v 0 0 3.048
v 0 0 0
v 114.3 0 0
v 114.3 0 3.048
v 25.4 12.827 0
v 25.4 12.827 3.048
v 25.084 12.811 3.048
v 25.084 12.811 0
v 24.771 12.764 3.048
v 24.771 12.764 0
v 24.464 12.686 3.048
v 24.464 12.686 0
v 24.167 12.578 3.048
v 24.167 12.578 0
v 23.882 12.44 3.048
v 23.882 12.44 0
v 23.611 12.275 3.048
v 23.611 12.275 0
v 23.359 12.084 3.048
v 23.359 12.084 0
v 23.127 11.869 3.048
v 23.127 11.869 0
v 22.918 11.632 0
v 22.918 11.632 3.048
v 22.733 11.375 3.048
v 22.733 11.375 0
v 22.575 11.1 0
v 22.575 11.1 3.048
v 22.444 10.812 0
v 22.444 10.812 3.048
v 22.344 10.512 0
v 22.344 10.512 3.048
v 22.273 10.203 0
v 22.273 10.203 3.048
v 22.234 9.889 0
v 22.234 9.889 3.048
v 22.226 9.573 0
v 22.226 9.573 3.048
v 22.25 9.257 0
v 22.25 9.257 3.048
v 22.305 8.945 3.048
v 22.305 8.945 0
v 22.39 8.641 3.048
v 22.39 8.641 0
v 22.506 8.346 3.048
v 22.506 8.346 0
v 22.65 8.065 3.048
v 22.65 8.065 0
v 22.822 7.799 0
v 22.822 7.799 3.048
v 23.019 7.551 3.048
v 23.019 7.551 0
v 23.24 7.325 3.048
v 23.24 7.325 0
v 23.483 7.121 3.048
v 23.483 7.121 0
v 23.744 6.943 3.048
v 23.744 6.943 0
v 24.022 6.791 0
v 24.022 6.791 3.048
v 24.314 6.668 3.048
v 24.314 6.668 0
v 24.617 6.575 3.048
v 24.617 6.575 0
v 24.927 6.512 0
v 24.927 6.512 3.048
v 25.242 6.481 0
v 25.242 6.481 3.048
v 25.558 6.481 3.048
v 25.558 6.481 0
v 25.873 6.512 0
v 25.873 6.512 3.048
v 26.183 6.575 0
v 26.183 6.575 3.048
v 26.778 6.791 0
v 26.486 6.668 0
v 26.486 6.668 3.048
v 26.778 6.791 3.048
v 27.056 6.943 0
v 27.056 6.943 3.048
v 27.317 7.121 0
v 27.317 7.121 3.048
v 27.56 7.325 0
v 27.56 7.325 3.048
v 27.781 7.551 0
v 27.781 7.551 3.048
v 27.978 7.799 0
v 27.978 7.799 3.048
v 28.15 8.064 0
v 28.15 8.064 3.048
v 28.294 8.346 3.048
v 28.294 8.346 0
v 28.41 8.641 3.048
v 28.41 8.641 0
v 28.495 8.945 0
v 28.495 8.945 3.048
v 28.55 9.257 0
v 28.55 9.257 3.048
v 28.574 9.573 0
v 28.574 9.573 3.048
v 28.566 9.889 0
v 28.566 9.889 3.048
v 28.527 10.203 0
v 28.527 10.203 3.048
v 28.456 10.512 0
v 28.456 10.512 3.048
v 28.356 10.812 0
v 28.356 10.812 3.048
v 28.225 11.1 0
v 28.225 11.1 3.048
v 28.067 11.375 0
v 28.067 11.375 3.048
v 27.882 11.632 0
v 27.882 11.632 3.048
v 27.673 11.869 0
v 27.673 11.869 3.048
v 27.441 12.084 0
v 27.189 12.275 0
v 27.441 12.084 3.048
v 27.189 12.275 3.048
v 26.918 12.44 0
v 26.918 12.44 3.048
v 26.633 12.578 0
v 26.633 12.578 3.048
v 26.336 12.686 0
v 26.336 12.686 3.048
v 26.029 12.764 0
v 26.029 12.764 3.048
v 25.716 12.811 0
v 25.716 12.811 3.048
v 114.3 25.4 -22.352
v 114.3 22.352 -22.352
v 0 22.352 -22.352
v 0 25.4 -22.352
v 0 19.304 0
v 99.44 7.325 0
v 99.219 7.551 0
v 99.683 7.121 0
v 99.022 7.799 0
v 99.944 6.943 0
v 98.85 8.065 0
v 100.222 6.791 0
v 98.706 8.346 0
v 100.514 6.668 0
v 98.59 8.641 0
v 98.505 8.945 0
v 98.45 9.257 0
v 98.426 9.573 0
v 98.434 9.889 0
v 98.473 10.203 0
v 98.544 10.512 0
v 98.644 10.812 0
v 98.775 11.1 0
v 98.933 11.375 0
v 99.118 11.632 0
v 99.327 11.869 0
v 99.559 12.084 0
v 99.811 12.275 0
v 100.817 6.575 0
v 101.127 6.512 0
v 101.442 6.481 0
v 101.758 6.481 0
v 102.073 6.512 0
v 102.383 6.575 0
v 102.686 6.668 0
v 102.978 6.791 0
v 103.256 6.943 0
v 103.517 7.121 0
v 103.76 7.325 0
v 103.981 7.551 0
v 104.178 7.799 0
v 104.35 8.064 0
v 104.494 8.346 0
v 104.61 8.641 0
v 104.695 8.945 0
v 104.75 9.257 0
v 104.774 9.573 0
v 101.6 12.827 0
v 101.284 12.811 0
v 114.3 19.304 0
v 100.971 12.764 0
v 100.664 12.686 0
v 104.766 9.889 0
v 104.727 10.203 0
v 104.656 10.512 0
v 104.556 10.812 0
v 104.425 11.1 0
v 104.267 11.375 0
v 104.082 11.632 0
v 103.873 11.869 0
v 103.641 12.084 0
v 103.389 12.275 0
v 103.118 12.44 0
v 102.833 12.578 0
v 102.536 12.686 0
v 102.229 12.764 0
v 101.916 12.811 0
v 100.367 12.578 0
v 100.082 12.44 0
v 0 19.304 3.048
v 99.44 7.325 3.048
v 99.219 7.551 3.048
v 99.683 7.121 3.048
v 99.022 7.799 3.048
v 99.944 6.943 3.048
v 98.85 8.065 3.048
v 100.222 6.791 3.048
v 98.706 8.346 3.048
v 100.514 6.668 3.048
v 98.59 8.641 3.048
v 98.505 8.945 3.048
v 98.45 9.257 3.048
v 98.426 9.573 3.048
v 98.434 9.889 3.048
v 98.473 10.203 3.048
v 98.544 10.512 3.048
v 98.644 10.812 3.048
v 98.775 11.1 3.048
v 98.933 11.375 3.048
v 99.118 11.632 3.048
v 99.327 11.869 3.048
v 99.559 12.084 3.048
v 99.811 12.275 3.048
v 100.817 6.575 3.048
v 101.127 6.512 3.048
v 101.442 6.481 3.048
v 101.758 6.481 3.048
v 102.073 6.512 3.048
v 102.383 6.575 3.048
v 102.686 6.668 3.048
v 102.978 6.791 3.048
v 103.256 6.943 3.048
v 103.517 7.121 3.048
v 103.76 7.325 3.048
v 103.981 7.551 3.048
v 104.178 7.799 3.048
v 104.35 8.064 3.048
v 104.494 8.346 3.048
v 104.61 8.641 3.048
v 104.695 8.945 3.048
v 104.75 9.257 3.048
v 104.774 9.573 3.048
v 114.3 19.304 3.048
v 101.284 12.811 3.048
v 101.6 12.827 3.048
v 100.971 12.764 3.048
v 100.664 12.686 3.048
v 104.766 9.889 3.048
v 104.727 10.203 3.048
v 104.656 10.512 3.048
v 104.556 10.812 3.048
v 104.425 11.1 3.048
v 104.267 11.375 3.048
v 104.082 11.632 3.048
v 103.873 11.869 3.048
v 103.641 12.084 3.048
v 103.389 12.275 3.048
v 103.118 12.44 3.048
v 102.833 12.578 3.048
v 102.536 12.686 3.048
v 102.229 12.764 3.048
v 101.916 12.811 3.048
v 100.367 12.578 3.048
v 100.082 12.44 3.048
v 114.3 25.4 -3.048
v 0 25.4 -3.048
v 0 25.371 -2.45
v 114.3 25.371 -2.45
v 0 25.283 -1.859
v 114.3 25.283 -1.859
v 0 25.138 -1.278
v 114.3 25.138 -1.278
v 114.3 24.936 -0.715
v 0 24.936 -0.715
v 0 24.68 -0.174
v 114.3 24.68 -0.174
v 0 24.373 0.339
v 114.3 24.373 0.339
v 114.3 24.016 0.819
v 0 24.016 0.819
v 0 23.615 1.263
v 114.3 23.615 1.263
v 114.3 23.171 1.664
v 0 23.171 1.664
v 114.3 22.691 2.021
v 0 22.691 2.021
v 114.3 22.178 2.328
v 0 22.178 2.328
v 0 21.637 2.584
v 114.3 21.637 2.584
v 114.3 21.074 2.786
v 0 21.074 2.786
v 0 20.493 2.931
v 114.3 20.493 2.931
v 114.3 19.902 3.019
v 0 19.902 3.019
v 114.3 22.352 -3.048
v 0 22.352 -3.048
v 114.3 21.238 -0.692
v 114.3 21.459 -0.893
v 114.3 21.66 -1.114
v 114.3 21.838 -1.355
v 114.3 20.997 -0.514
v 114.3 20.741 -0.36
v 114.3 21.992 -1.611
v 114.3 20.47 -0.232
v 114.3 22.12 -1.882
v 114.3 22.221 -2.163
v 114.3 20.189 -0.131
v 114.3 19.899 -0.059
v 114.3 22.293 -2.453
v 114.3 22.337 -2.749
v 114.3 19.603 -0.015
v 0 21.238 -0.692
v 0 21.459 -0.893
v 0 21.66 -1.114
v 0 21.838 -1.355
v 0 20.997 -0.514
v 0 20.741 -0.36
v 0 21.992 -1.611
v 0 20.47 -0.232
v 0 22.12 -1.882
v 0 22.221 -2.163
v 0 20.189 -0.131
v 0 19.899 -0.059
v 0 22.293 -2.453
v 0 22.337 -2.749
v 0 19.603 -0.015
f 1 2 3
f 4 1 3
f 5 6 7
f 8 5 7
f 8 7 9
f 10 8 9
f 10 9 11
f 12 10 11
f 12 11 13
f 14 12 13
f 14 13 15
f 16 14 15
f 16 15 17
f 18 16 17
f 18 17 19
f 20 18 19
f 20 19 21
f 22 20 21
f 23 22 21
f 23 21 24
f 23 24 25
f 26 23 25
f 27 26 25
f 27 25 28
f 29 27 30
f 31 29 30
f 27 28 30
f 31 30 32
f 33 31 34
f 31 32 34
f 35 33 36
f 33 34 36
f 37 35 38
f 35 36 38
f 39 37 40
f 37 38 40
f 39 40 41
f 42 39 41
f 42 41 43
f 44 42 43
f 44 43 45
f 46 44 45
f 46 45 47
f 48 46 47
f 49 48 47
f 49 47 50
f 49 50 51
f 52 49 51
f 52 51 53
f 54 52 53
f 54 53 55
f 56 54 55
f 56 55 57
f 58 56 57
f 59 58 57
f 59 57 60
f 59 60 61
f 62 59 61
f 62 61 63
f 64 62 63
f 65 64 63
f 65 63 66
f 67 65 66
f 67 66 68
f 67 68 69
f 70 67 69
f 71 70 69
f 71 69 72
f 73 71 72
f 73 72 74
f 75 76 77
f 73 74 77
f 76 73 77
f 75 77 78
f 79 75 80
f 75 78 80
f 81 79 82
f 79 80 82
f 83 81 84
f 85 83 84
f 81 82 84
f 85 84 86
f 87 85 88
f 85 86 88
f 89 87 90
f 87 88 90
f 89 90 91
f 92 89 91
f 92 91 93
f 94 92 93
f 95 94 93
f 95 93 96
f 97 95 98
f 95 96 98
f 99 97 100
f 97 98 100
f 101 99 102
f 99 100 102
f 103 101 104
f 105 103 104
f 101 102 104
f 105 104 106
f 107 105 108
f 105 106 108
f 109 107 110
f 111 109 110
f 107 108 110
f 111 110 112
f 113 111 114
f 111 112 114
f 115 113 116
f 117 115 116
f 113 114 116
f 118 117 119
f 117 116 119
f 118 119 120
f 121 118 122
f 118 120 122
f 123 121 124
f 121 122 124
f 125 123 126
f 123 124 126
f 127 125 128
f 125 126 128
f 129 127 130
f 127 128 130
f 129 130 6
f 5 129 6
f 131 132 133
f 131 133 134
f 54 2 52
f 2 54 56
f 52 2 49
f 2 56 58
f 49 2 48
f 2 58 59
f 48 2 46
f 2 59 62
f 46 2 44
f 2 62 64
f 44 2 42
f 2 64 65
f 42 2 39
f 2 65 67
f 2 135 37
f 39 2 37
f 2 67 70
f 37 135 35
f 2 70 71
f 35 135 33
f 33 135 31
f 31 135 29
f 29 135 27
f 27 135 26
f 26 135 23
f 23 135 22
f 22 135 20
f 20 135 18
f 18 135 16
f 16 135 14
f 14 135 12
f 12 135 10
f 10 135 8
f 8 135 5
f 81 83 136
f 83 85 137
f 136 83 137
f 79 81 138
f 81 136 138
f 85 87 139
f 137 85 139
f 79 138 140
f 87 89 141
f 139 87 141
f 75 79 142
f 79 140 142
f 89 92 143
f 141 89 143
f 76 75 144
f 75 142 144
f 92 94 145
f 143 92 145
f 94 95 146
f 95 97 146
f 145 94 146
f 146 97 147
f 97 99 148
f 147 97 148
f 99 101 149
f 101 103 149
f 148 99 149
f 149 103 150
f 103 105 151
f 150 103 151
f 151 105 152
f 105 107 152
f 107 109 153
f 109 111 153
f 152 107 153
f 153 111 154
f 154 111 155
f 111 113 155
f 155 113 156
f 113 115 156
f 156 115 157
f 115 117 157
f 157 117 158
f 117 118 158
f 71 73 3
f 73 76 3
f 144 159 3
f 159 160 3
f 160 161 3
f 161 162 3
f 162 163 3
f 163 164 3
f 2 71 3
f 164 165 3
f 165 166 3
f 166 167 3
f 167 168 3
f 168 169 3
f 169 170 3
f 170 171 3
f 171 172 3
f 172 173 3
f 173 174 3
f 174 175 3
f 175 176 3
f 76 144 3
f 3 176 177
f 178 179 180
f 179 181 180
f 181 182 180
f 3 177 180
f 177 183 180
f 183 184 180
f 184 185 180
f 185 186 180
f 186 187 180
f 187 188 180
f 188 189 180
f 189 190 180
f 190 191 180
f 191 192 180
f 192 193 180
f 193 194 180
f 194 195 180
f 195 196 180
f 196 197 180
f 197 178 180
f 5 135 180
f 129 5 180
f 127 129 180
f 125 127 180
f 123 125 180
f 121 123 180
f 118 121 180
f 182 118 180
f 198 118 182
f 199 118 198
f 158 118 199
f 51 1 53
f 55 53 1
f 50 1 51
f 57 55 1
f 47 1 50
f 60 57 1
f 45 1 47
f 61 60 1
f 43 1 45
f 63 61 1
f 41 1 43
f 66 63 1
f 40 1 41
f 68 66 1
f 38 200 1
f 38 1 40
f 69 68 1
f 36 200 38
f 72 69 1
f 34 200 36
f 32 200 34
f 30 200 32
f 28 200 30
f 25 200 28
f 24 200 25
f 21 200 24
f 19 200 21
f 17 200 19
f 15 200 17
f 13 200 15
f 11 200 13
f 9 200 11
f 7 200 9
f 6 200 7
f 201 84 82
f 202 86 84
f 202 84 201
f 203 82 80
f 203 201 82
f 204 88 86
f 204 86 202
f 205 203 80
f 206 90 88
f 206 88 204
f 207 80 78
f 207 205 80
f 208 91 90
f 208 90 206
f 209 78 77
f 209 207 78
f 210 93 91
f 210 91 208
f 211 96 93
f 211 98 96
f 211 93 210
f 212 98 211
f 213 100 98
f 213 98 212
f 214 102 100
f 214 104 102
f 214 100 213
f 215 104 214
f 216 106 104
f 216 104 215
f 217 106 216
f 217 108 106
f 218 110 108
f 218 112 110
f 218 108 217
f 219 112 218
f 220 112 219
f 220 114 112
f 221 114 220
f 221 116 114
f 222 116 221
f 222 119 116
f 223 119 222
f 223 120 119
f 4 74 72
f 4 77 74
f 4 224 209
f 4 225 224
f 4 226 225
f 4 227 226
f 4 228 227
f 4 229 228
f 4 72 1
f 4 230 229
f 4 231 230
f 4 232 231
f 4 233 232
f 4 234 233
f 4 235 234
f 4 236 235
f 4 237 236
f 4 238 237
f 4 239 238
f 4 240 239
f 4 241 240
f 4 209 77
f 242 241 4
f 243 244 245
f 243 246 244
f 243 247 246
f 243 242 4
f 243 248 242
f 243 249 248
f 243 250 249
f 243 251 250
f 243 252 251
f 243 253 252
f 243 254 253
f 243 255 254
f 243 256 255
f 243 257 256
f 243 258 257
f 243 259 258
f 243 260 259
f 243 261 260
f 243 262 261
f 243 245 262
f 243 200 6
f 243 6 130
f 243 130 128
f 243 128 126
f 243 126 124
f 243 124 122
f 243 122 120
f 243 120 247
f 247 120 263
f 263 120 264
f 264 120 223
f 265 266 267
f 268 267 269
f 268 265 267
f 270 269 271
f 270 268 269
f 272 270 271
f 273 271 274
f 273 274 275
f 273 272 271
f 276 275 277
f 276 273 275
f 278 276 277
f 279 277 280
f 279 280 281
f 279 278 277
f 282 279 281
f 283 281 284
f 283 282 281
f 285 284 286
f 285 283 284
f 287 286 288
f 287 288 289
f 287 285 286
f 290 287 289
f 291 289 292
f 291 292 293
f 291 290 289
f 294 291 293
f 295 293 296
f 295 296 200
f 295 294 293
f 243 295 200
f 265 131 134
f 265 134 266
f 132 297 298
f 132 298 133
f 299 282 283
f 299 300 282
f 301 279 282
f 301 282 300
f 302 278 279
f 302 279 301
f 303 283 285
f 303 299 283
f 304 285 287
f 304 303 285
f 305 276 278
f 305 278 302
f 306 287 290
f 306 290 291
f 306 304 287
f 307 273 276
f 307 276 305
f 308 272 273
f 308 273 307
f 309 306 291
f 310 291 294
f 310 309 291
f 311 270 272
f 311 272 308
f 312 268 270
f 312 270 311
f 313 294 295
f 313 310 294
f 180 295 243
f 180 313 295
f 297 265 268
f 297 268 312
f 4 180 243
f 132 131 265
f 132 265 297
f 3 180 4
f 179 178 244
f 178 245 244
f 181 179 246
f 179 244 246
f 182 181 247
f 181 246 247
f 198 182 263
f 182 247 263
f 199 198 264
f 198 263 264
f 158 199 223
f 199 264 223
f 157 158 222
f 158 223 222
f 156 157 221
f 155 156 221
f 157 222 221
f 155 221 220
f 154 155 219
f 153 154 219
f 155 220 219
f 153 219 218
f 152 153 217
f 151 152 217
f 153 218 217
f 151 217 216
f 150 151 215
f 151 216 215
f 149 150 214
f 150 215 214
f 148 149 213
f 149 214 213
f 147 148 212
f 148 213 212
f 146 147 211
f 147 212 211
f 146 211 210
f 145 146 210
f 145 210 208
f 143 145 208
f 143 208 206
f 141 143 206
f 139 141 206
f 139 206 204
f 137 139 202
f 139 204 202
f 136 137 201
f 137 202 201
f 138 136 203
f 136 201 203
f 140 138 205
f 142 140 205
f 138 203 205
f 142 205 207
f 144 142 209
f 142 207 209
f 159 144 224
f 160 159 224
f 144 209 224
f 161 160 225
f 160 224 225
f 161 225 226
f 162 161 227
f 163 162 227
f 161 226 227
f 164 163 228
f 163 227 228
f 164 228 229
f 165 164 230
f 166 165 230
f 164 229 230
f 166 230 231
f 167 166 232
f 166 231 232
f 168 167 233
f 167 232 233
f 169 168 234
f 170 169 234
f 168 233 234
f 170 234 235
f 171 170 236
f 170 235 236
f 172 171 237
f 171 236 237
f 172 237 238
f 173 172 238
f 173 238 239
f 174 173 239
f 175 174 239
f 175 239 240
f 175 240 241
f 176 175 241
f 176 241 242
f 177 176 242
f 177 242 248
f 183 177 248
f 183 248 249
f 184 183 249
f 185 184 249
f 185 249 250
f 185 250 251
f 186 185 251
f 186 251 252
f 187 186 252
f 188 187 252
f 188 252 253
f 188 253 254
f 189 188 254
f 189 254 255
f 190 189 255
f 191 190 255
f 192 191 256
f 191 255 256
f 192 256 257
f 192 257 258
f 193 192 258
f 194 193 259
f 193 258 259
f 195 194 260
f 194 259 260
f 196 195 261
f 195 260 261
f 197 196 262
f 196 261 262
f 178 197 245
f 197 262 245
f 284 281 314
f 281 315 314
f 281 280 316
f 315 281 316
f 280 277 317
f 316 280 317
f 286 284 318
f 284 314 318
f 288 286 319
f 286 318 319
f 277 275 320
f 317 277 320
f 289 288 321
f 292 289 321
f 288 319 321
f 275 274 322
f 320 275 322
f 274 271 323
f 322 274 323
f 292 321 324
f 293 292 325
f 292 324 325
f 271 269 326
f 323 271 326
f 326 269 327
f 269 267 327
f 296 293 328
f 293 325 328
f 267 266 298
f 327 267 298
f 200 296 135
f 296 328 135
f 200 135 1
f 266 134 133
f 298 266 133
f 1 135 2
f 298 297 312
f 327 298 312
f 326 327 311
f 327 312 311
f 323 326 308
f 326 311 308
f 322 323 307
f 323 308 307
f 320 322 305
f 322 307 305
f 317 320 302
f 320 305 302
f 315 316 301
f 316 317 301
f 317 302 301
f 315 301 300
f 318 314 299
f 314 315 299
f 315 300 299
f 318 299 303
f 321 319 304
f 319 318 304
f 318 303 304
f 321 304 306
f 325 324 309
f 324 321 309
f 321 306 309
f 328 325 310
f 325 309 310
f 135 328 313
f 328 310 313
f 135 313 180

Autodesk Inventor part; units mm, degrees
ref_plane "YZ Plane" through (0, 0, 0) normal (1, 0, 0) x (0, 1, 0)
ref_plane "XZ Plane" through (0, 0, 0) normal (0, 1, 0) x (-1, 0, 0)
ref_plane "XY Plane" through (0, 0, 0) normal (0, 0, 1) x (1, 0, 0)
sketch "Sketch1" plane through (0, 0, 0) normal (0, 0, 1) x (1, 0, 0)
  line L0 (0, 0) -> (114.3, 0)
  line L1 (114.3, 0) -> (114.3, 25.4)
  line L2 (114.3, 25.4) -> (0, 25.4)
  line L3 (0, 25.4) -> (0, 0)
  dimension "d0" = 114.3
  dimension "d1" = 25.4
extrude "Plate1" add sketch "Sketch1" along normal blind 3.048
sketch "Sketch2" plane through (114.3, 22.352, 3.048) normal (0, 1, 0) x (-1, 0, 0)
  line L0 (114.3, 0) -> (0, 0)
  line L1 (0, 0) -> (0, -25.4)
  line L2 (0, -25.4) -> (114.3, -25.4)
  line L3 (114.3, -25.4) -> (114.3, 0)
edge flange "Flange1" height 25.4 angle 90 thickness 3.048 bend radius 3.048 thickness toward (0, 1, 0) relief tear relief width 3.048 relief depth 1.524 edges at (57.15, 25.4, 0) wall of the first edge with corners at (0, 22.352, 3.048) (114.3, 22.352, 3.048) (114.3, 22.352, -22.352) (0, 22.352, -22.352)
bend "Bend1"
corner "Corner1"
hole "Hole1" at (101.6, 9.652, 0) direction (0, 0, 1) diameter 6.35 end through all
hole "Hole2" at (25.4, 9.652, 0) direction (0, 0, 1) diameter 6.35 end through all
equation "\"d20\" = Thickness"
equation "\"d29\" = Thickness"
equation "\"d3\" = BendReliefWidth"
equation "\"d4\" = BendReliefDepth"
equation "\"d5\" = MinimumRemnant"
equation "\"d6\" = BendRadius"
equation "\"d9\" = BendRadius"
equation "\"d10\" = CornerReliefSize"
equation "\"d11\" = GapSize"
equation "\"d12\" = JacobiRadiusSize"
equation "\"BendRadius\" = Thickness"
equation "\"BendReliefWidth\" = Thickness"
equation "\"BendReliefDepth\" = 0.5 * Thickness"
equation "\"CornerReliefSize\" = 4 * Thickness"
equation "\"MinimumRemnant\" = 2 * Thickness"
equation "\"TransitionRadius\" = BendRadius"
equation "\"JacobiRadiusSize\" = BendRadius"
equation "\"GapSize\" = Thickness"
equation "\"d2\" = BendRadius"
equation "\"Thickness\" = 3.048"
properties part number "Chain Tension - L Bracket"
